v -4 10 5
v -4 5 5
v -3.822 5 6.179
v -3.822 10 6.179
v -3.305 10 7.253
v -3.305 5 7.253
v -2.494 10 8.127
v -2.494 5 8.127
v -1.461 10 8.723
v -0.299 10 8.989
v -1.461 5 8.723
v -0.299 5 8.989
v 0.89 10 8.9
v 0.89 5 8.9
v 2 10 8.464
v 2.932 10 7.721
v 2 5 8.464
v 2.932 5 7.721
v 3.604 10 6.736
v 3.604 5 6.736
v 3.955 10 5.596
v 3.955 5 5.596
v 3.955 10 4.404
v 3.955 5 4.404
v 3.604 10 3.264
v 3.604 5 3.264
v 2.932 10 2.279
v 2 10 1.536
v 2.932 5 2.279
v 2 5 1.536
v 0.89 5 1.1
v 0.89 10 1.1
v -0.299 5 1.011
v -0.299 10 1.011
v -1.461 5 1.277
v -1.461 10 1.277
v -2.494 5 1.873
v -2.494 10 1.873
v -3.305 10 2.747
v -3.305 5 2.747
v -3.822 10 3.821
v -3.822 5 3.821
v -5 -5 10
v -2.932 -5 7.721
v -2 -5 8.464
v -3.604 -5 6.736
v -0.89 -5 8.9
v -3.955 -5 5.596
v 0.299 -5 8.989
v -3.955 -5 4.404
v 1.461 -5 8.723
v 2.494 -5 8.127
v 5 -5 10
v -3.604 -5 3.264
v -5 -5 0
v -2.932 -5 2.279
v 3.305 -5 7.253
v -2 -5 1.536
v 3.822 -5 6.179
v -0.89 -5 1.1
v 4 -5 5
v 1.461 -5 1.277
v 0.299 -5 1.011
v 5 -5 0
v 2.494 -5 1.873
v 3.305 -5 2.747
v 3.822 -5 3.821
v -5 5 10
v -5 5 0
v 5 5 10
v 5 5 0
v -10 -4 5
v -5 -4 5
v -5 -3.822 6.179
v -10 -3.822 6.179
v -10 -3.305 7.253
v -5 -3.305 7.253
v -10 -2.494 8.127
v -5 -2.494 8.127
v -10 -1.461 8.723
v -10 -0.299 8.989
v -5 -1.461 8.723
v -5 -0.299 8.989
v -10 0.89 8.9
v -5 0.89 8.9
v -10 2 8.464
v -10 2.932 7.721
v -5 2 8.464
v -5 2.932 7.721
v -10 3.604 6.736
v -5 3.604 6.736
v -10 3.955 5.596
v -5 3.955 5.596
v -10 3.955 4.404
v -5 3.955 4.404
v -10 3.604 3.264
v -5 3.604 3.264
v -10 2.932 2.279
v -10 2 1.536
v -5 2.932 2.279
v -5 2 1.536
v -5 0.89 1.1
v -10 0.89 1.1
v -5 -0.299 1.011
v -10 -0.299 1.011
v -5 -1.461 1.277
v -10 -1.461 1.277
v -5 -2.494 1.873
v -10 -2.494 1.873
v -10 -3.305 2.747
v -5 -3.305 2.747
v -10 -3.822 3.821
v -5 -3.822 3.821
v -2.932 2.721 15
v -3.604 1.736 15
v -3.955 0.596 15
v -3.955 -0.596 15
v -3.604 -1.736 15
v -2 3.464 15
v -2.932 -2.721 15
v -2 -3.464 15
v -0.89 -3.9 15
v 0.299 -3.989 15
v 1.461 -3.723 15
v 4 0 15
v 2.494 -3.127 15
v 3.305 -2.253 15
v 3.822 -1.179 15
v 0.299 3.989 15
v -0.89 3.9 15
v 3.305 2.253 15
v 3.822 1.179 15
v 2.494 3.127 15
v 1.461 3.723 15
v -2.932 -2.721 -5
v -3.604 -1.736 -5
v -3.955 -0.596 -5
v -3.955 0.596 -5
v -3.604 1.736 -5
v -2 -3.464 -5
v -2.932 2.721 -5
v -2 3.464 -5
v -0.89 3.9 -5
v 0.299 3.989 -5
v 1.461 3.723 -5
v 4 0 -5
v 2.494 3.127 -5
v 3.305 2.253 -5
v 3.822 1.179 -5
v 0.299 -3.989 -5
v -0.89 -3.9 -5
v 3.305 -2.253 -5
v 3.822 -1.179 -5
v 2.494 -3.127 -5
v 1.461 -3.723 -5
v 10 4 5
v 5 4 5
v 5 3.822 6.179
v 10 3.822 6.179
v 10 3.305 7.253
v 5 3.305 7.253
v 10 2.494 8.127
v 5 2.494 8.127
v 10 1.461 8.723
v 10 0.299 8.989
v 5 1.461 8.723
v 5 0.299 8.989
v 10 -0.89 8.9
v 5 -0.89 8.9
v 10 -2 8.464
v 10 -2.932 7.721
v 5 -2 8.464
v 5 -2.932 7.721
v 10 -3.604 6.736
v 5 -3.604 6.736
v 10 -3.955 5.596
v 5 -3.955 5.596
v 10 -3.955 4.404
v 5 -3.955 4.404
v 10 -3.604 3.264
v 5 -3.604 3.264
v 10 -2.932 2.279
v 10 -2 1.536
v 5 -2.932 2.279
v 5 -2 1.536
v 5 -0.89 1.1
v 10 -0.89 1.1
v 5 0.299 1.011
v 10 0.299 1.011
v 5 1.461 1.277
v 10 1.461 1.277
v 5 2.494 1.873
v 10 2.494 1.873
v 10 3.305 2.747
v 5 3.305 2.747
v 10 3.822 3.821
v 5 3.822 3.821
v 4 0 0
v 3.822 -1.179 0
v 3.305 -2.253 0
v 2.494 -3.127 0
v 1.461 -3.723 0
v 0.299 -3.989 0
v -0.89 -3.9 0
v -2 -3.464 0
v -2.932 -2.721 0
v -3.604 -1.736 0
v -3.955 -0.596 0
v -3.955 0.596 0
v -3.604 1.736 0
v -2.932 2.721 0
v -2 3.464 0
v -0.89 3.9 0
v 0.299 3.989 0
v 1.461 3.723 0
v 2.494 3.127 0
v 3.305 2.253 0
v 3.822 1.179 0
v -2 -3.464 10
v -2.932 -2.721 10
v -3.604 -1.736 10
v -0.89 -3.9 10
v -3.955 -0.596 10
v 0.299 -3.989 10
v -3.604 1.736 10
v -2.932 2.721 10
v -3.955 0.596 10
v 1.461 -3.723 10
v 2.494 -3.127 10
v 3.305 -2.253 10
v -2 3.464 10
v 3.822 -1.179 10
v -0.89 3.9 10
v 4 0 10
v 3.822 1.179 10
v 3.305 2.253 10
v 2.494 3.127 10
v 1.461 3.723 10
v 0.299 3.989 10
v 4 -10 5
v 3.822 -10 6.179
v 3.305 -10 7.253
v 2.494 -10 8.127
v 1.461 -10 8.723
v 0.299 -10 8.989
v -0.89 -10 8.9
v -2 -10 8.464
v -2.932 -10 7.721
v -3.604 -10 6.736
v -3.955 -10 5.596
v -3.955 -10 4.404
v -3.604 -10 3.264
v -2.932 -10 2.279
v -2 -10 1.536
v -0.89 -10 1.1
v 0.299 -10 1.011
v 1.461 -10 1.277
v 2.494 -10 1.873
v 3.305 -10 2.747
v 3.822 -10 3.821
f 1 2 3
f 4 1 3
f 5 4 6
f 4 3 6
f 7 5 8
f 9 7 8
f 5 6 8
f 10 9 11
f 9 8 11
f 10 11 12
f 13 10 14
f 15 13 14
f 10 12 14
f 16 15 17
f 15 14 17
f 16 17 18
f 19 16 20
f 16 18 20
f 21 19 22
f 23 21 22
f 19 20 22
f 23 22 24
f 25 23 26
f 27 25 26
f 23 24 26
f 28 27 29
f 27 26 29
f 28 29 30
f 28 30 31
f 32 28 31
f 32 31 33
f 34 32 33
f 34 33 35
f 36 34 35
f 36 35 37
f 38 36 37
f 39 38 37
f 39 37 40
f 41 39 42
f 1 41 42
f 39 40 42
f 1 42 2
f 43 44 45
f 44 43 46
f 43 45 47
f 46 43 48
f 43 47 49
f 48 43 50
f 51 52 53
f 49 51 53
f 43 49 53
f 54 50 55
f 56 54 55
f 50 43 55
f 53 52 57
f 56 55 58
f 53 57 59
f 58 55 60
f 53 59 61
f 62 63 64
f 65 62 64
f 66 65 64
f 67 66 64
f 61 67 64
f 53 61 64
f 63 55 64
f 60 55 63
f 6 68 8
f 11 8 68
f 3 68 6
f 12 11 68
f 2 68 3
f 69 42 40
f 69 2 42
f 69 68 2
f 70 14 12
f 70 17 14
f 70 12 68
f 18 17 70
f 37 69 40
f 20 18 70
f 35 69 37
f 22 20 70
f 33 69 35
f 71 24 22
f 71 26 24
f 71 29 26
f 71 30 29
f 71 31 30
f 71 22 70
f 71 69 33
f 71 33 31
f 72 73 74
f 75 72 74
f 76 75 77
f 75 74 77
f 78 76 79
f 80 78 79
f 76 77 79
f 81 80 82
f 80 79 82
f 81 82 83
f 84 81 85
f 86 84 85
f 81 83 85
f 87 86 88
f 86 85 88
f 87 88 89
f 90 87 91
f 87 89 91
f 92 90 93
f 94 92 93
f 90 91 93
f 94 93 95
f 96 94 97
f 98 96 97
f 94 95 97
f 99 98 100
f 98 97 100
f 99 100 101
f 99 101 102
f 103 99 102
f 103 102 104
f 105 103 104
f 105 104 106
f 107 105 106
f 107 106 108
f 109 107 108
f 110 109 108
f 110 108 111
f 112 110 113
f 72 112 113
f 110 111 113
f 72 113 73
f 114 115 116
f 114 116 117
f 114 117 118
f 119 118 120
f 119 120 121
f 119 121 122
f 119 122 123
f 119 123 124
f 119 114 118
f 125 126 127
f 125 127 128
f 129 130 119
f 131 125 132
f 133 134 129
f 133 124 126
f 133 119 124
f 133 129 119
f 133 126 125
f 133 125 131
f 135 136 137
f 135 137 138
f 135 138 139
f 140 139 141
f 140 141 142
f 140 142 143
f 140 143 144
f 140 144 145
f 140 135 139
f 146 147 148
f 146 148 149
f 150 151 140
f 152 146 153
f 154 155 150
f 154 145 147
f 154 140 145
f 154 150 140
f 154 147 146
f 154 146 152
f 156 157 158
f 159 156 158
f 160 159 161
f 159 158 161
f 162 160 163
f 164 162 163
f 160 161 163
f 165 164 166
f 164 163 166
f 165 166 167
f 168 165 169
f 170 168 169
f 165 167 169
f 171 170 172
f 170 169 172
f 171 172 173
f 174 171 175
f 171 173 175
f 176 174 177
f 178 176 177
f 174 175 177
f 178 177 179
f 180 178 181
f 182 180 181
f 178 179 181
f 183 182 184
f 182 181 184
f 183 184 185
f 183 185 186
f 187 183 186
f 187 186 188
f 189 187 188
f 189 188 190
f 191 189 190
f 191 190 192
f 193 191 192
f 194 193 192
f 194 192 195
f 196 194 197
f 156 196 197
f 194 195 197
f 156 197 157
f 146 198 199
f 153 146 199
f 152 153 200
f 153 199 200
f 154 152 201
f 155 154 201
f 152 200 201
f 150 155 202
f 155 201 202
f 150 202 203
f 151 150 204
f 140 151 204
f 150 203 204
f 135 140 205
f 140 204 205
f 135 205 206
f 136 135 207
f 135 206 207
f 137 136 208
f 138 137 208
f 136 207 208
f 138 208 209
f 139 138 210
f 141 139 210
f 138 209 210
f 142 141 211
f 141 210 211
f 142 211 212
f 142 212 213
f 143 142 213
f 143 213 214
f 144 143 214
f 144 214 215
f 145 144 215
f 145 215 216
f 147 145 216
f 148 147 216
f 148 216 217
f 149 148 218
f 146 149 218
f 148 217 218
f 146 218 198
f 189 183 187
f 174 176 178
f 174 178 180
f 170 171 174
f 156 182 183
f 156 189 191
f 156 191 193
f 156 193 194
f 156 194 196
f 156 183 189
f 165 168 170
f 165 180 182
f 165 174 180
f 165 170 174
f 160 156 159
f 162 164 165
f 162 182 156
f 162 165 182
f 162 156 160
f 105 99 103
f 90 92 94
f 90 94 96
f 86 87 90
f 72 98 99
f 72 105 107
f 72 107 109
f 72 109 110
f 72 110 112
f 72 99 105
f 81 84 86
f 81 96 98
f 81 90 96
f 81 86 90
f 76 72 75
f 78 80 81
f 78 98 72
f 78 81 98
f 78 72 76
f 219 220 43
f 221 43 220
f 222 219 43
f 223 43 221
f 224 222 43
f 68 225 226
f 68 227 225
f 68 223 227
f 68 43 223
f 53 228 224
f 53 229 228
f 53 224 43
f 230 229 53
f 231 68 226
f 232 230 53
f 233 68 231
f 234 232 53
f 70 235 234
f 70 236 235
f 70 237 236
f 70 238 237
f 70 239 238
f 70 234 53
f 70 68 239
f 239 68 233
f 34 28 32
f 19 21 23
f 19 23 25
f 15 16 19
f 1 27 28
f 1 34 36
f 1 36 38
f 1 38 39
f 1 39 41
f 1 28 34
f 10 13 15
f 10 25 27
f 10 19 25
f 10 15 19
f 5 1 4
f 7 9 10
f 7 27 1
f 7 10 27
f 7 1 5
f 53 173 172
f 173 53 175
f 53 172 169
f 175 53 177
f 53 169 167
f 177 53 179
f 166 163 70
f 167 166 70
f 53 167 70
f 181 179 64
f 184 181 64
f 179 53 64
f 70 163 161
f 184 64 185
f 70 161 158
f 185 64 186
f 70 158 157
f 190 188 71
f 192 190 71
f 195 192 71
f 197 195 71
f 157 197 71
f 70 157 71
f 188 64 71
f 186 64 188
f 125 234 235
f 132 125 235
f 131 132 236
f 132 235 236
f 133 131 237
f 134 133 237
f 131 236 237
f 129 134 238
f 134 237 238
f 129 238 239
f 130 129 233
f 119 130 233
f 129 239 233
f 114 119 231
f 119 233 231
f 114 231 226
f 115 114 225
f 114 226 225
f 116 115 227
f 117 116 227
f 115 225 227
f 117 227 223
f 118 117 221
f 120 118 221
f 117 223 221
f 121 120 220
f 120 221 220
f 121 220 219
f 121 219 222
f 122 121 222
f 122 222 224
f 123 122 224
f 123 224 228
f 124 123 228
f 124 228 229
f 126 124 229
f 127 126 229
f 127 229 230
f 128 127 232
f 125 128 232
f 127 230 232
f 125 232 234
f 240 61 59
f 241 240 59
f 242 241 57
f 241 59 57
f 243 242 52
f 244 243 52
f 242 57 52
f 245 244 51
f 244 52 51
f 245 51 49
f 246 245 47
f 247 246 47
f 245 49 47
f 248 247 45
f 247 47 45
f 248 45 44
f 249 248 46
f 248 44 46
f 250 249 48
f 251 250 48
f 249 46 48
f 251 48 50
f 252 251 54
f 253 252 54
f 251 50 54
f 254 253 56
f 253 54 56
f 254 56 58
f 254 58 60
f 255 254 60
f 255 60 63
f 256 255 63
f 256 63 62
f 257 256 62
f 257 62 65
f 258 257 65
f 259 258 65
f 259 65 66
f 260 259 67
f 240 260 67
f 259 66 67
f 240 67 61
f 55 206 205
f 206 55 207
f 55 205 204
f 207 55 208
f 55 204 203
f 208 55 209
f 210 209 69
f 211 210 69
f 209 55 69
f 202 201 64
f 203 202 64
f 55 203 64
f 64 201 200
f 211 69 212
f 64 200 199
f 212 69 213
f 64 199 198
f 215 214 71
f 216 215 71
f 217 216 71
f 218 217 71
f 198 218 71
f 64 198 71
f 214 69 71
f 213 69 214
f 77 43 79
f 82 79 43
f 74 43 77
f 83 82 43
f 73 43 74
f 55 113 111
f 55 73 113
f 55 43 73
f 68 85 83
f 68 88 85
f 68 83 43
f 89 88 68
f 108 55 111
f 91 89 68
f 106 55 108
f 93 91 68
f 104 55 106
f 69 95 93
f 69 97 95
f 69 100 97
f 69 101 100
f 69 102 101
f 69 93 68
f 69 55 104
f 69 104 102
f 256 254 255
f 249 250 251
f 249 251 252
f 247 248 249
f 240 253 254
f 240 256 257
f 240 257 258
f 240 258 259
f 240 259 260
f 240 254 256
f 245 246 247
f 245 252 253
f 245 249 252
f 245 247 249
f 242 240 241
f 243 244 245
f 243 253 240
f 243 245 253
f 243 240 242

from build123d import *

# Parameters (mm, degrees)
F0_W      = 10
F0_H      = 10
F1_DEPTH  = 10
F2_R      = 4
F3_DEPTH  = 5
F4_R      = 4
F5_DEPTH  = 5
F6_R      = 4
F7_DEPTH  = 5
F8_R      = 4
F9_DEPTH  = 5
F10_R     = 4
F11_DEPTH = 5
F12_R     = 4
F13_DEPTH = 5


with BuildPart() as f1:
    # F0 (on Top) → F1 (new body)
    with BuildSketch(Plane.XY):
        Rectangle(F0_W, F0_H)
    extrude(amount=F1_DEPTH)

    # F2 (on face) → F3 (join)
    with BuildSketch(Plane.YZ.offset(5)):
        with Locations((0, 5)):
            Circle(F2_R)
    extrude(amount=F3_DEPTH)

    # F4 (on face) → F5 (join)
    with BuildSketch(Plane(origin=(0, 0, 0), x_dir=(1, 0, 0), z_dir=(0, 0, -1))):
        Circle(F4_R)
    extrude(amount=F5_DEPTH)

    # F6 (on face) → F7 (join)
    with BuildSketch(Plane(origin=(-5, 0, 0), x_dir=(0, -1, 0), z_dir=(-1, 0, 0))):
        with Locations((0, 5)):
            Circle(F6_R)
    extrude(amount=F7_DEPTH)

    # F8 (on face) → F9 (join)
    with BuildSketch(Plane.XY.offset(10)):
        Circle(F8_R)
    extrude(amount=F9_DEPTH)

    # F10 (on face) → F11 (join)
    with BuildSketch(Plane(origin=(0, 5, 0), x_dir=(-1, 0, 0), z_dir=(0, 1, 0))):
        with Locations((0, 5)):
            Circle(F10_R)
    extrude(amount=F11_DEPTH)

    # F12 (on face) → F13 (join)
    with BuildSketch(Plane.XZ.offset(5)):
        with Locations((0, 5)):
            Circle(F12_R)
    extrude(amount=F13_DEPTH)


solid = f1.part
